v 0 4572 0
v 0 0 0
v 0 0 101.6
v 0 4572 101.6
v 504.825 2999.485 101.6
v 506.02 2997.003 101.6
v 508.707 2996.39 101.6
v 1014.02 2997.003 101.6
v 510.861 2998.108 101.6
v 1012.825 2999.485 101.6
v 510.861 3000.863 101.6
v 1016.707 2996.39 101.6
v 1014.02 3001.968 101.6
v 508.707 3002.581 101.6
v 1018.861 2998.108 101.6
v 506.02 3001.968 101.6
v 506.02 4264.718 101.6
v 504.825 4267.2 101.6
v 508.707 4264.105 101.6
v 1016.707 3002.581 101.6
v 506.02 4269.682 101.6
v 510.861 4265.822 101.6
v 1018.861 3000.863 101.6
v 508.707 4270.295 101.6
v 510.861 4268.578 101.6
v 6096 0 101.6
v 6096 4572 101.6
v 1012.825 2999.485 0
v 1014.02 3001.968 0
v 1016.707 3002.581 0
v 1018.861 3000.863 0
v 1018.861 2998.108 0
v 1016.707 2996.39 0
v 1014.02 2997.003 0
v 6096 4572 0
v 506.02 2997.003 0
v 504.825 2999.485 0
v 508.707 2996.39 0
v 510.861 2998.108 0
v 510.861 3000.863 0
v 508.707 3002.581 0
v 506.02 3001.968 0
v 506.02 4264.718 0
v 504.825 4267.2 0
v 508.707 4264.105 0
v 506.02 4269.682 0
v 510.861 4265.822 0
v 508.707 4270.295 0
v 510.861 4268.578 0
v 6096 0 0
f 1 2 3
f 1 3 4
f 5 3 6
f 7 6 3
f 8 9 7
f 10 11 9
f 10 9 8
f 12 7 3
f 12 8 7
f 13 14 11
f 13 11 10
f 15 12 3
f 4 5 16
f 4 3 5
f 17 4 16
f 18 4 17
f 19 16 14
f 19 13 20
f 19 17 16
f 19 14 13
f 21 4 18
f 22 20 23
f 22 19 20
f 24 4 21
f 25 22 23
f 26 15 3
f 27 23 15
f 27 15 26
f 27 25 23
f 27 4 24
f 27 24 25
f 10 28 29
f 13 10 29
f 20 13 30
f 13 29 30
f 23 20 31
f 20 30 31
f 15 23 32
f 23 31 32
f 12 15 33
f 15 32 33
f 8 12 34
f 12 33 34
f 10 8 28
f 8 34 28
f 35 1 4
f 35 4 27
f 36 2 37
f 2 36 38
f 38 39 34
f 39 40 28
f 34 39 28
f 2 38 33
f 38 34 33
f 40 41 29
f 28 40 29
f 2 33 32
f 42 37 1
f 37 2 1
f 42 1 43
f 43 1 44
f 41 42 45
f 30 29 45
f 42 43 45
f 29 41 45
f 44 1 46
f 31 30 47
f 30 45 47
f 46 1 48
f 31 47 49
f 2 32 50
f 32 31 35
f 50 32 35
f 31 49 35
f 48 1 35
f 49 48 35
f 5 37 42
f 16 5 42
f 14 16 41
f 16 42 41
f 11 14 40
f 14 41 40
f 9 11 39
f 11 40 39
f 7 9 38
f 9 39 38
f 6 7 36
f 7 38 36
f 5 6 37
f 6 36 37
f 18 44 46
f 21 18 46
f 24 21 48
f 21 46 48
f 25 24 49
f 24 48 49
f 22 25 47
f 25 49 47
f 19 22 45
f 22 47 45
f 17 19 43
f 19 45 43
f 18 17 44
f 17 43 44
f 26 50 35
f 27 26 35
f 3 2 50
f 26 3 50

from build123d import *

# Parameters (mm, degrees)
F0_W     = 6096
F0_H     = 4572
F1_DEPTH = 101.6
F3_D     = 6.35


with BuildPart() as f1:
    # F0 (on Top) → F1 (new body)
    with BuildSketch(Plane.XY):
        with Locations((3048, 2286)):
            Rectangle(F0_W, F0_H)
    extrude(amount=F1_DEPTH)

    # F3 (through all)
    with Locations(Plane.XY.offset(101.6)):
        with Locations((508, 2999.485468), (1016, 2999.485468), (508, 4267.2)):
            Hole(F3_D / 2)


solid = f1.part
